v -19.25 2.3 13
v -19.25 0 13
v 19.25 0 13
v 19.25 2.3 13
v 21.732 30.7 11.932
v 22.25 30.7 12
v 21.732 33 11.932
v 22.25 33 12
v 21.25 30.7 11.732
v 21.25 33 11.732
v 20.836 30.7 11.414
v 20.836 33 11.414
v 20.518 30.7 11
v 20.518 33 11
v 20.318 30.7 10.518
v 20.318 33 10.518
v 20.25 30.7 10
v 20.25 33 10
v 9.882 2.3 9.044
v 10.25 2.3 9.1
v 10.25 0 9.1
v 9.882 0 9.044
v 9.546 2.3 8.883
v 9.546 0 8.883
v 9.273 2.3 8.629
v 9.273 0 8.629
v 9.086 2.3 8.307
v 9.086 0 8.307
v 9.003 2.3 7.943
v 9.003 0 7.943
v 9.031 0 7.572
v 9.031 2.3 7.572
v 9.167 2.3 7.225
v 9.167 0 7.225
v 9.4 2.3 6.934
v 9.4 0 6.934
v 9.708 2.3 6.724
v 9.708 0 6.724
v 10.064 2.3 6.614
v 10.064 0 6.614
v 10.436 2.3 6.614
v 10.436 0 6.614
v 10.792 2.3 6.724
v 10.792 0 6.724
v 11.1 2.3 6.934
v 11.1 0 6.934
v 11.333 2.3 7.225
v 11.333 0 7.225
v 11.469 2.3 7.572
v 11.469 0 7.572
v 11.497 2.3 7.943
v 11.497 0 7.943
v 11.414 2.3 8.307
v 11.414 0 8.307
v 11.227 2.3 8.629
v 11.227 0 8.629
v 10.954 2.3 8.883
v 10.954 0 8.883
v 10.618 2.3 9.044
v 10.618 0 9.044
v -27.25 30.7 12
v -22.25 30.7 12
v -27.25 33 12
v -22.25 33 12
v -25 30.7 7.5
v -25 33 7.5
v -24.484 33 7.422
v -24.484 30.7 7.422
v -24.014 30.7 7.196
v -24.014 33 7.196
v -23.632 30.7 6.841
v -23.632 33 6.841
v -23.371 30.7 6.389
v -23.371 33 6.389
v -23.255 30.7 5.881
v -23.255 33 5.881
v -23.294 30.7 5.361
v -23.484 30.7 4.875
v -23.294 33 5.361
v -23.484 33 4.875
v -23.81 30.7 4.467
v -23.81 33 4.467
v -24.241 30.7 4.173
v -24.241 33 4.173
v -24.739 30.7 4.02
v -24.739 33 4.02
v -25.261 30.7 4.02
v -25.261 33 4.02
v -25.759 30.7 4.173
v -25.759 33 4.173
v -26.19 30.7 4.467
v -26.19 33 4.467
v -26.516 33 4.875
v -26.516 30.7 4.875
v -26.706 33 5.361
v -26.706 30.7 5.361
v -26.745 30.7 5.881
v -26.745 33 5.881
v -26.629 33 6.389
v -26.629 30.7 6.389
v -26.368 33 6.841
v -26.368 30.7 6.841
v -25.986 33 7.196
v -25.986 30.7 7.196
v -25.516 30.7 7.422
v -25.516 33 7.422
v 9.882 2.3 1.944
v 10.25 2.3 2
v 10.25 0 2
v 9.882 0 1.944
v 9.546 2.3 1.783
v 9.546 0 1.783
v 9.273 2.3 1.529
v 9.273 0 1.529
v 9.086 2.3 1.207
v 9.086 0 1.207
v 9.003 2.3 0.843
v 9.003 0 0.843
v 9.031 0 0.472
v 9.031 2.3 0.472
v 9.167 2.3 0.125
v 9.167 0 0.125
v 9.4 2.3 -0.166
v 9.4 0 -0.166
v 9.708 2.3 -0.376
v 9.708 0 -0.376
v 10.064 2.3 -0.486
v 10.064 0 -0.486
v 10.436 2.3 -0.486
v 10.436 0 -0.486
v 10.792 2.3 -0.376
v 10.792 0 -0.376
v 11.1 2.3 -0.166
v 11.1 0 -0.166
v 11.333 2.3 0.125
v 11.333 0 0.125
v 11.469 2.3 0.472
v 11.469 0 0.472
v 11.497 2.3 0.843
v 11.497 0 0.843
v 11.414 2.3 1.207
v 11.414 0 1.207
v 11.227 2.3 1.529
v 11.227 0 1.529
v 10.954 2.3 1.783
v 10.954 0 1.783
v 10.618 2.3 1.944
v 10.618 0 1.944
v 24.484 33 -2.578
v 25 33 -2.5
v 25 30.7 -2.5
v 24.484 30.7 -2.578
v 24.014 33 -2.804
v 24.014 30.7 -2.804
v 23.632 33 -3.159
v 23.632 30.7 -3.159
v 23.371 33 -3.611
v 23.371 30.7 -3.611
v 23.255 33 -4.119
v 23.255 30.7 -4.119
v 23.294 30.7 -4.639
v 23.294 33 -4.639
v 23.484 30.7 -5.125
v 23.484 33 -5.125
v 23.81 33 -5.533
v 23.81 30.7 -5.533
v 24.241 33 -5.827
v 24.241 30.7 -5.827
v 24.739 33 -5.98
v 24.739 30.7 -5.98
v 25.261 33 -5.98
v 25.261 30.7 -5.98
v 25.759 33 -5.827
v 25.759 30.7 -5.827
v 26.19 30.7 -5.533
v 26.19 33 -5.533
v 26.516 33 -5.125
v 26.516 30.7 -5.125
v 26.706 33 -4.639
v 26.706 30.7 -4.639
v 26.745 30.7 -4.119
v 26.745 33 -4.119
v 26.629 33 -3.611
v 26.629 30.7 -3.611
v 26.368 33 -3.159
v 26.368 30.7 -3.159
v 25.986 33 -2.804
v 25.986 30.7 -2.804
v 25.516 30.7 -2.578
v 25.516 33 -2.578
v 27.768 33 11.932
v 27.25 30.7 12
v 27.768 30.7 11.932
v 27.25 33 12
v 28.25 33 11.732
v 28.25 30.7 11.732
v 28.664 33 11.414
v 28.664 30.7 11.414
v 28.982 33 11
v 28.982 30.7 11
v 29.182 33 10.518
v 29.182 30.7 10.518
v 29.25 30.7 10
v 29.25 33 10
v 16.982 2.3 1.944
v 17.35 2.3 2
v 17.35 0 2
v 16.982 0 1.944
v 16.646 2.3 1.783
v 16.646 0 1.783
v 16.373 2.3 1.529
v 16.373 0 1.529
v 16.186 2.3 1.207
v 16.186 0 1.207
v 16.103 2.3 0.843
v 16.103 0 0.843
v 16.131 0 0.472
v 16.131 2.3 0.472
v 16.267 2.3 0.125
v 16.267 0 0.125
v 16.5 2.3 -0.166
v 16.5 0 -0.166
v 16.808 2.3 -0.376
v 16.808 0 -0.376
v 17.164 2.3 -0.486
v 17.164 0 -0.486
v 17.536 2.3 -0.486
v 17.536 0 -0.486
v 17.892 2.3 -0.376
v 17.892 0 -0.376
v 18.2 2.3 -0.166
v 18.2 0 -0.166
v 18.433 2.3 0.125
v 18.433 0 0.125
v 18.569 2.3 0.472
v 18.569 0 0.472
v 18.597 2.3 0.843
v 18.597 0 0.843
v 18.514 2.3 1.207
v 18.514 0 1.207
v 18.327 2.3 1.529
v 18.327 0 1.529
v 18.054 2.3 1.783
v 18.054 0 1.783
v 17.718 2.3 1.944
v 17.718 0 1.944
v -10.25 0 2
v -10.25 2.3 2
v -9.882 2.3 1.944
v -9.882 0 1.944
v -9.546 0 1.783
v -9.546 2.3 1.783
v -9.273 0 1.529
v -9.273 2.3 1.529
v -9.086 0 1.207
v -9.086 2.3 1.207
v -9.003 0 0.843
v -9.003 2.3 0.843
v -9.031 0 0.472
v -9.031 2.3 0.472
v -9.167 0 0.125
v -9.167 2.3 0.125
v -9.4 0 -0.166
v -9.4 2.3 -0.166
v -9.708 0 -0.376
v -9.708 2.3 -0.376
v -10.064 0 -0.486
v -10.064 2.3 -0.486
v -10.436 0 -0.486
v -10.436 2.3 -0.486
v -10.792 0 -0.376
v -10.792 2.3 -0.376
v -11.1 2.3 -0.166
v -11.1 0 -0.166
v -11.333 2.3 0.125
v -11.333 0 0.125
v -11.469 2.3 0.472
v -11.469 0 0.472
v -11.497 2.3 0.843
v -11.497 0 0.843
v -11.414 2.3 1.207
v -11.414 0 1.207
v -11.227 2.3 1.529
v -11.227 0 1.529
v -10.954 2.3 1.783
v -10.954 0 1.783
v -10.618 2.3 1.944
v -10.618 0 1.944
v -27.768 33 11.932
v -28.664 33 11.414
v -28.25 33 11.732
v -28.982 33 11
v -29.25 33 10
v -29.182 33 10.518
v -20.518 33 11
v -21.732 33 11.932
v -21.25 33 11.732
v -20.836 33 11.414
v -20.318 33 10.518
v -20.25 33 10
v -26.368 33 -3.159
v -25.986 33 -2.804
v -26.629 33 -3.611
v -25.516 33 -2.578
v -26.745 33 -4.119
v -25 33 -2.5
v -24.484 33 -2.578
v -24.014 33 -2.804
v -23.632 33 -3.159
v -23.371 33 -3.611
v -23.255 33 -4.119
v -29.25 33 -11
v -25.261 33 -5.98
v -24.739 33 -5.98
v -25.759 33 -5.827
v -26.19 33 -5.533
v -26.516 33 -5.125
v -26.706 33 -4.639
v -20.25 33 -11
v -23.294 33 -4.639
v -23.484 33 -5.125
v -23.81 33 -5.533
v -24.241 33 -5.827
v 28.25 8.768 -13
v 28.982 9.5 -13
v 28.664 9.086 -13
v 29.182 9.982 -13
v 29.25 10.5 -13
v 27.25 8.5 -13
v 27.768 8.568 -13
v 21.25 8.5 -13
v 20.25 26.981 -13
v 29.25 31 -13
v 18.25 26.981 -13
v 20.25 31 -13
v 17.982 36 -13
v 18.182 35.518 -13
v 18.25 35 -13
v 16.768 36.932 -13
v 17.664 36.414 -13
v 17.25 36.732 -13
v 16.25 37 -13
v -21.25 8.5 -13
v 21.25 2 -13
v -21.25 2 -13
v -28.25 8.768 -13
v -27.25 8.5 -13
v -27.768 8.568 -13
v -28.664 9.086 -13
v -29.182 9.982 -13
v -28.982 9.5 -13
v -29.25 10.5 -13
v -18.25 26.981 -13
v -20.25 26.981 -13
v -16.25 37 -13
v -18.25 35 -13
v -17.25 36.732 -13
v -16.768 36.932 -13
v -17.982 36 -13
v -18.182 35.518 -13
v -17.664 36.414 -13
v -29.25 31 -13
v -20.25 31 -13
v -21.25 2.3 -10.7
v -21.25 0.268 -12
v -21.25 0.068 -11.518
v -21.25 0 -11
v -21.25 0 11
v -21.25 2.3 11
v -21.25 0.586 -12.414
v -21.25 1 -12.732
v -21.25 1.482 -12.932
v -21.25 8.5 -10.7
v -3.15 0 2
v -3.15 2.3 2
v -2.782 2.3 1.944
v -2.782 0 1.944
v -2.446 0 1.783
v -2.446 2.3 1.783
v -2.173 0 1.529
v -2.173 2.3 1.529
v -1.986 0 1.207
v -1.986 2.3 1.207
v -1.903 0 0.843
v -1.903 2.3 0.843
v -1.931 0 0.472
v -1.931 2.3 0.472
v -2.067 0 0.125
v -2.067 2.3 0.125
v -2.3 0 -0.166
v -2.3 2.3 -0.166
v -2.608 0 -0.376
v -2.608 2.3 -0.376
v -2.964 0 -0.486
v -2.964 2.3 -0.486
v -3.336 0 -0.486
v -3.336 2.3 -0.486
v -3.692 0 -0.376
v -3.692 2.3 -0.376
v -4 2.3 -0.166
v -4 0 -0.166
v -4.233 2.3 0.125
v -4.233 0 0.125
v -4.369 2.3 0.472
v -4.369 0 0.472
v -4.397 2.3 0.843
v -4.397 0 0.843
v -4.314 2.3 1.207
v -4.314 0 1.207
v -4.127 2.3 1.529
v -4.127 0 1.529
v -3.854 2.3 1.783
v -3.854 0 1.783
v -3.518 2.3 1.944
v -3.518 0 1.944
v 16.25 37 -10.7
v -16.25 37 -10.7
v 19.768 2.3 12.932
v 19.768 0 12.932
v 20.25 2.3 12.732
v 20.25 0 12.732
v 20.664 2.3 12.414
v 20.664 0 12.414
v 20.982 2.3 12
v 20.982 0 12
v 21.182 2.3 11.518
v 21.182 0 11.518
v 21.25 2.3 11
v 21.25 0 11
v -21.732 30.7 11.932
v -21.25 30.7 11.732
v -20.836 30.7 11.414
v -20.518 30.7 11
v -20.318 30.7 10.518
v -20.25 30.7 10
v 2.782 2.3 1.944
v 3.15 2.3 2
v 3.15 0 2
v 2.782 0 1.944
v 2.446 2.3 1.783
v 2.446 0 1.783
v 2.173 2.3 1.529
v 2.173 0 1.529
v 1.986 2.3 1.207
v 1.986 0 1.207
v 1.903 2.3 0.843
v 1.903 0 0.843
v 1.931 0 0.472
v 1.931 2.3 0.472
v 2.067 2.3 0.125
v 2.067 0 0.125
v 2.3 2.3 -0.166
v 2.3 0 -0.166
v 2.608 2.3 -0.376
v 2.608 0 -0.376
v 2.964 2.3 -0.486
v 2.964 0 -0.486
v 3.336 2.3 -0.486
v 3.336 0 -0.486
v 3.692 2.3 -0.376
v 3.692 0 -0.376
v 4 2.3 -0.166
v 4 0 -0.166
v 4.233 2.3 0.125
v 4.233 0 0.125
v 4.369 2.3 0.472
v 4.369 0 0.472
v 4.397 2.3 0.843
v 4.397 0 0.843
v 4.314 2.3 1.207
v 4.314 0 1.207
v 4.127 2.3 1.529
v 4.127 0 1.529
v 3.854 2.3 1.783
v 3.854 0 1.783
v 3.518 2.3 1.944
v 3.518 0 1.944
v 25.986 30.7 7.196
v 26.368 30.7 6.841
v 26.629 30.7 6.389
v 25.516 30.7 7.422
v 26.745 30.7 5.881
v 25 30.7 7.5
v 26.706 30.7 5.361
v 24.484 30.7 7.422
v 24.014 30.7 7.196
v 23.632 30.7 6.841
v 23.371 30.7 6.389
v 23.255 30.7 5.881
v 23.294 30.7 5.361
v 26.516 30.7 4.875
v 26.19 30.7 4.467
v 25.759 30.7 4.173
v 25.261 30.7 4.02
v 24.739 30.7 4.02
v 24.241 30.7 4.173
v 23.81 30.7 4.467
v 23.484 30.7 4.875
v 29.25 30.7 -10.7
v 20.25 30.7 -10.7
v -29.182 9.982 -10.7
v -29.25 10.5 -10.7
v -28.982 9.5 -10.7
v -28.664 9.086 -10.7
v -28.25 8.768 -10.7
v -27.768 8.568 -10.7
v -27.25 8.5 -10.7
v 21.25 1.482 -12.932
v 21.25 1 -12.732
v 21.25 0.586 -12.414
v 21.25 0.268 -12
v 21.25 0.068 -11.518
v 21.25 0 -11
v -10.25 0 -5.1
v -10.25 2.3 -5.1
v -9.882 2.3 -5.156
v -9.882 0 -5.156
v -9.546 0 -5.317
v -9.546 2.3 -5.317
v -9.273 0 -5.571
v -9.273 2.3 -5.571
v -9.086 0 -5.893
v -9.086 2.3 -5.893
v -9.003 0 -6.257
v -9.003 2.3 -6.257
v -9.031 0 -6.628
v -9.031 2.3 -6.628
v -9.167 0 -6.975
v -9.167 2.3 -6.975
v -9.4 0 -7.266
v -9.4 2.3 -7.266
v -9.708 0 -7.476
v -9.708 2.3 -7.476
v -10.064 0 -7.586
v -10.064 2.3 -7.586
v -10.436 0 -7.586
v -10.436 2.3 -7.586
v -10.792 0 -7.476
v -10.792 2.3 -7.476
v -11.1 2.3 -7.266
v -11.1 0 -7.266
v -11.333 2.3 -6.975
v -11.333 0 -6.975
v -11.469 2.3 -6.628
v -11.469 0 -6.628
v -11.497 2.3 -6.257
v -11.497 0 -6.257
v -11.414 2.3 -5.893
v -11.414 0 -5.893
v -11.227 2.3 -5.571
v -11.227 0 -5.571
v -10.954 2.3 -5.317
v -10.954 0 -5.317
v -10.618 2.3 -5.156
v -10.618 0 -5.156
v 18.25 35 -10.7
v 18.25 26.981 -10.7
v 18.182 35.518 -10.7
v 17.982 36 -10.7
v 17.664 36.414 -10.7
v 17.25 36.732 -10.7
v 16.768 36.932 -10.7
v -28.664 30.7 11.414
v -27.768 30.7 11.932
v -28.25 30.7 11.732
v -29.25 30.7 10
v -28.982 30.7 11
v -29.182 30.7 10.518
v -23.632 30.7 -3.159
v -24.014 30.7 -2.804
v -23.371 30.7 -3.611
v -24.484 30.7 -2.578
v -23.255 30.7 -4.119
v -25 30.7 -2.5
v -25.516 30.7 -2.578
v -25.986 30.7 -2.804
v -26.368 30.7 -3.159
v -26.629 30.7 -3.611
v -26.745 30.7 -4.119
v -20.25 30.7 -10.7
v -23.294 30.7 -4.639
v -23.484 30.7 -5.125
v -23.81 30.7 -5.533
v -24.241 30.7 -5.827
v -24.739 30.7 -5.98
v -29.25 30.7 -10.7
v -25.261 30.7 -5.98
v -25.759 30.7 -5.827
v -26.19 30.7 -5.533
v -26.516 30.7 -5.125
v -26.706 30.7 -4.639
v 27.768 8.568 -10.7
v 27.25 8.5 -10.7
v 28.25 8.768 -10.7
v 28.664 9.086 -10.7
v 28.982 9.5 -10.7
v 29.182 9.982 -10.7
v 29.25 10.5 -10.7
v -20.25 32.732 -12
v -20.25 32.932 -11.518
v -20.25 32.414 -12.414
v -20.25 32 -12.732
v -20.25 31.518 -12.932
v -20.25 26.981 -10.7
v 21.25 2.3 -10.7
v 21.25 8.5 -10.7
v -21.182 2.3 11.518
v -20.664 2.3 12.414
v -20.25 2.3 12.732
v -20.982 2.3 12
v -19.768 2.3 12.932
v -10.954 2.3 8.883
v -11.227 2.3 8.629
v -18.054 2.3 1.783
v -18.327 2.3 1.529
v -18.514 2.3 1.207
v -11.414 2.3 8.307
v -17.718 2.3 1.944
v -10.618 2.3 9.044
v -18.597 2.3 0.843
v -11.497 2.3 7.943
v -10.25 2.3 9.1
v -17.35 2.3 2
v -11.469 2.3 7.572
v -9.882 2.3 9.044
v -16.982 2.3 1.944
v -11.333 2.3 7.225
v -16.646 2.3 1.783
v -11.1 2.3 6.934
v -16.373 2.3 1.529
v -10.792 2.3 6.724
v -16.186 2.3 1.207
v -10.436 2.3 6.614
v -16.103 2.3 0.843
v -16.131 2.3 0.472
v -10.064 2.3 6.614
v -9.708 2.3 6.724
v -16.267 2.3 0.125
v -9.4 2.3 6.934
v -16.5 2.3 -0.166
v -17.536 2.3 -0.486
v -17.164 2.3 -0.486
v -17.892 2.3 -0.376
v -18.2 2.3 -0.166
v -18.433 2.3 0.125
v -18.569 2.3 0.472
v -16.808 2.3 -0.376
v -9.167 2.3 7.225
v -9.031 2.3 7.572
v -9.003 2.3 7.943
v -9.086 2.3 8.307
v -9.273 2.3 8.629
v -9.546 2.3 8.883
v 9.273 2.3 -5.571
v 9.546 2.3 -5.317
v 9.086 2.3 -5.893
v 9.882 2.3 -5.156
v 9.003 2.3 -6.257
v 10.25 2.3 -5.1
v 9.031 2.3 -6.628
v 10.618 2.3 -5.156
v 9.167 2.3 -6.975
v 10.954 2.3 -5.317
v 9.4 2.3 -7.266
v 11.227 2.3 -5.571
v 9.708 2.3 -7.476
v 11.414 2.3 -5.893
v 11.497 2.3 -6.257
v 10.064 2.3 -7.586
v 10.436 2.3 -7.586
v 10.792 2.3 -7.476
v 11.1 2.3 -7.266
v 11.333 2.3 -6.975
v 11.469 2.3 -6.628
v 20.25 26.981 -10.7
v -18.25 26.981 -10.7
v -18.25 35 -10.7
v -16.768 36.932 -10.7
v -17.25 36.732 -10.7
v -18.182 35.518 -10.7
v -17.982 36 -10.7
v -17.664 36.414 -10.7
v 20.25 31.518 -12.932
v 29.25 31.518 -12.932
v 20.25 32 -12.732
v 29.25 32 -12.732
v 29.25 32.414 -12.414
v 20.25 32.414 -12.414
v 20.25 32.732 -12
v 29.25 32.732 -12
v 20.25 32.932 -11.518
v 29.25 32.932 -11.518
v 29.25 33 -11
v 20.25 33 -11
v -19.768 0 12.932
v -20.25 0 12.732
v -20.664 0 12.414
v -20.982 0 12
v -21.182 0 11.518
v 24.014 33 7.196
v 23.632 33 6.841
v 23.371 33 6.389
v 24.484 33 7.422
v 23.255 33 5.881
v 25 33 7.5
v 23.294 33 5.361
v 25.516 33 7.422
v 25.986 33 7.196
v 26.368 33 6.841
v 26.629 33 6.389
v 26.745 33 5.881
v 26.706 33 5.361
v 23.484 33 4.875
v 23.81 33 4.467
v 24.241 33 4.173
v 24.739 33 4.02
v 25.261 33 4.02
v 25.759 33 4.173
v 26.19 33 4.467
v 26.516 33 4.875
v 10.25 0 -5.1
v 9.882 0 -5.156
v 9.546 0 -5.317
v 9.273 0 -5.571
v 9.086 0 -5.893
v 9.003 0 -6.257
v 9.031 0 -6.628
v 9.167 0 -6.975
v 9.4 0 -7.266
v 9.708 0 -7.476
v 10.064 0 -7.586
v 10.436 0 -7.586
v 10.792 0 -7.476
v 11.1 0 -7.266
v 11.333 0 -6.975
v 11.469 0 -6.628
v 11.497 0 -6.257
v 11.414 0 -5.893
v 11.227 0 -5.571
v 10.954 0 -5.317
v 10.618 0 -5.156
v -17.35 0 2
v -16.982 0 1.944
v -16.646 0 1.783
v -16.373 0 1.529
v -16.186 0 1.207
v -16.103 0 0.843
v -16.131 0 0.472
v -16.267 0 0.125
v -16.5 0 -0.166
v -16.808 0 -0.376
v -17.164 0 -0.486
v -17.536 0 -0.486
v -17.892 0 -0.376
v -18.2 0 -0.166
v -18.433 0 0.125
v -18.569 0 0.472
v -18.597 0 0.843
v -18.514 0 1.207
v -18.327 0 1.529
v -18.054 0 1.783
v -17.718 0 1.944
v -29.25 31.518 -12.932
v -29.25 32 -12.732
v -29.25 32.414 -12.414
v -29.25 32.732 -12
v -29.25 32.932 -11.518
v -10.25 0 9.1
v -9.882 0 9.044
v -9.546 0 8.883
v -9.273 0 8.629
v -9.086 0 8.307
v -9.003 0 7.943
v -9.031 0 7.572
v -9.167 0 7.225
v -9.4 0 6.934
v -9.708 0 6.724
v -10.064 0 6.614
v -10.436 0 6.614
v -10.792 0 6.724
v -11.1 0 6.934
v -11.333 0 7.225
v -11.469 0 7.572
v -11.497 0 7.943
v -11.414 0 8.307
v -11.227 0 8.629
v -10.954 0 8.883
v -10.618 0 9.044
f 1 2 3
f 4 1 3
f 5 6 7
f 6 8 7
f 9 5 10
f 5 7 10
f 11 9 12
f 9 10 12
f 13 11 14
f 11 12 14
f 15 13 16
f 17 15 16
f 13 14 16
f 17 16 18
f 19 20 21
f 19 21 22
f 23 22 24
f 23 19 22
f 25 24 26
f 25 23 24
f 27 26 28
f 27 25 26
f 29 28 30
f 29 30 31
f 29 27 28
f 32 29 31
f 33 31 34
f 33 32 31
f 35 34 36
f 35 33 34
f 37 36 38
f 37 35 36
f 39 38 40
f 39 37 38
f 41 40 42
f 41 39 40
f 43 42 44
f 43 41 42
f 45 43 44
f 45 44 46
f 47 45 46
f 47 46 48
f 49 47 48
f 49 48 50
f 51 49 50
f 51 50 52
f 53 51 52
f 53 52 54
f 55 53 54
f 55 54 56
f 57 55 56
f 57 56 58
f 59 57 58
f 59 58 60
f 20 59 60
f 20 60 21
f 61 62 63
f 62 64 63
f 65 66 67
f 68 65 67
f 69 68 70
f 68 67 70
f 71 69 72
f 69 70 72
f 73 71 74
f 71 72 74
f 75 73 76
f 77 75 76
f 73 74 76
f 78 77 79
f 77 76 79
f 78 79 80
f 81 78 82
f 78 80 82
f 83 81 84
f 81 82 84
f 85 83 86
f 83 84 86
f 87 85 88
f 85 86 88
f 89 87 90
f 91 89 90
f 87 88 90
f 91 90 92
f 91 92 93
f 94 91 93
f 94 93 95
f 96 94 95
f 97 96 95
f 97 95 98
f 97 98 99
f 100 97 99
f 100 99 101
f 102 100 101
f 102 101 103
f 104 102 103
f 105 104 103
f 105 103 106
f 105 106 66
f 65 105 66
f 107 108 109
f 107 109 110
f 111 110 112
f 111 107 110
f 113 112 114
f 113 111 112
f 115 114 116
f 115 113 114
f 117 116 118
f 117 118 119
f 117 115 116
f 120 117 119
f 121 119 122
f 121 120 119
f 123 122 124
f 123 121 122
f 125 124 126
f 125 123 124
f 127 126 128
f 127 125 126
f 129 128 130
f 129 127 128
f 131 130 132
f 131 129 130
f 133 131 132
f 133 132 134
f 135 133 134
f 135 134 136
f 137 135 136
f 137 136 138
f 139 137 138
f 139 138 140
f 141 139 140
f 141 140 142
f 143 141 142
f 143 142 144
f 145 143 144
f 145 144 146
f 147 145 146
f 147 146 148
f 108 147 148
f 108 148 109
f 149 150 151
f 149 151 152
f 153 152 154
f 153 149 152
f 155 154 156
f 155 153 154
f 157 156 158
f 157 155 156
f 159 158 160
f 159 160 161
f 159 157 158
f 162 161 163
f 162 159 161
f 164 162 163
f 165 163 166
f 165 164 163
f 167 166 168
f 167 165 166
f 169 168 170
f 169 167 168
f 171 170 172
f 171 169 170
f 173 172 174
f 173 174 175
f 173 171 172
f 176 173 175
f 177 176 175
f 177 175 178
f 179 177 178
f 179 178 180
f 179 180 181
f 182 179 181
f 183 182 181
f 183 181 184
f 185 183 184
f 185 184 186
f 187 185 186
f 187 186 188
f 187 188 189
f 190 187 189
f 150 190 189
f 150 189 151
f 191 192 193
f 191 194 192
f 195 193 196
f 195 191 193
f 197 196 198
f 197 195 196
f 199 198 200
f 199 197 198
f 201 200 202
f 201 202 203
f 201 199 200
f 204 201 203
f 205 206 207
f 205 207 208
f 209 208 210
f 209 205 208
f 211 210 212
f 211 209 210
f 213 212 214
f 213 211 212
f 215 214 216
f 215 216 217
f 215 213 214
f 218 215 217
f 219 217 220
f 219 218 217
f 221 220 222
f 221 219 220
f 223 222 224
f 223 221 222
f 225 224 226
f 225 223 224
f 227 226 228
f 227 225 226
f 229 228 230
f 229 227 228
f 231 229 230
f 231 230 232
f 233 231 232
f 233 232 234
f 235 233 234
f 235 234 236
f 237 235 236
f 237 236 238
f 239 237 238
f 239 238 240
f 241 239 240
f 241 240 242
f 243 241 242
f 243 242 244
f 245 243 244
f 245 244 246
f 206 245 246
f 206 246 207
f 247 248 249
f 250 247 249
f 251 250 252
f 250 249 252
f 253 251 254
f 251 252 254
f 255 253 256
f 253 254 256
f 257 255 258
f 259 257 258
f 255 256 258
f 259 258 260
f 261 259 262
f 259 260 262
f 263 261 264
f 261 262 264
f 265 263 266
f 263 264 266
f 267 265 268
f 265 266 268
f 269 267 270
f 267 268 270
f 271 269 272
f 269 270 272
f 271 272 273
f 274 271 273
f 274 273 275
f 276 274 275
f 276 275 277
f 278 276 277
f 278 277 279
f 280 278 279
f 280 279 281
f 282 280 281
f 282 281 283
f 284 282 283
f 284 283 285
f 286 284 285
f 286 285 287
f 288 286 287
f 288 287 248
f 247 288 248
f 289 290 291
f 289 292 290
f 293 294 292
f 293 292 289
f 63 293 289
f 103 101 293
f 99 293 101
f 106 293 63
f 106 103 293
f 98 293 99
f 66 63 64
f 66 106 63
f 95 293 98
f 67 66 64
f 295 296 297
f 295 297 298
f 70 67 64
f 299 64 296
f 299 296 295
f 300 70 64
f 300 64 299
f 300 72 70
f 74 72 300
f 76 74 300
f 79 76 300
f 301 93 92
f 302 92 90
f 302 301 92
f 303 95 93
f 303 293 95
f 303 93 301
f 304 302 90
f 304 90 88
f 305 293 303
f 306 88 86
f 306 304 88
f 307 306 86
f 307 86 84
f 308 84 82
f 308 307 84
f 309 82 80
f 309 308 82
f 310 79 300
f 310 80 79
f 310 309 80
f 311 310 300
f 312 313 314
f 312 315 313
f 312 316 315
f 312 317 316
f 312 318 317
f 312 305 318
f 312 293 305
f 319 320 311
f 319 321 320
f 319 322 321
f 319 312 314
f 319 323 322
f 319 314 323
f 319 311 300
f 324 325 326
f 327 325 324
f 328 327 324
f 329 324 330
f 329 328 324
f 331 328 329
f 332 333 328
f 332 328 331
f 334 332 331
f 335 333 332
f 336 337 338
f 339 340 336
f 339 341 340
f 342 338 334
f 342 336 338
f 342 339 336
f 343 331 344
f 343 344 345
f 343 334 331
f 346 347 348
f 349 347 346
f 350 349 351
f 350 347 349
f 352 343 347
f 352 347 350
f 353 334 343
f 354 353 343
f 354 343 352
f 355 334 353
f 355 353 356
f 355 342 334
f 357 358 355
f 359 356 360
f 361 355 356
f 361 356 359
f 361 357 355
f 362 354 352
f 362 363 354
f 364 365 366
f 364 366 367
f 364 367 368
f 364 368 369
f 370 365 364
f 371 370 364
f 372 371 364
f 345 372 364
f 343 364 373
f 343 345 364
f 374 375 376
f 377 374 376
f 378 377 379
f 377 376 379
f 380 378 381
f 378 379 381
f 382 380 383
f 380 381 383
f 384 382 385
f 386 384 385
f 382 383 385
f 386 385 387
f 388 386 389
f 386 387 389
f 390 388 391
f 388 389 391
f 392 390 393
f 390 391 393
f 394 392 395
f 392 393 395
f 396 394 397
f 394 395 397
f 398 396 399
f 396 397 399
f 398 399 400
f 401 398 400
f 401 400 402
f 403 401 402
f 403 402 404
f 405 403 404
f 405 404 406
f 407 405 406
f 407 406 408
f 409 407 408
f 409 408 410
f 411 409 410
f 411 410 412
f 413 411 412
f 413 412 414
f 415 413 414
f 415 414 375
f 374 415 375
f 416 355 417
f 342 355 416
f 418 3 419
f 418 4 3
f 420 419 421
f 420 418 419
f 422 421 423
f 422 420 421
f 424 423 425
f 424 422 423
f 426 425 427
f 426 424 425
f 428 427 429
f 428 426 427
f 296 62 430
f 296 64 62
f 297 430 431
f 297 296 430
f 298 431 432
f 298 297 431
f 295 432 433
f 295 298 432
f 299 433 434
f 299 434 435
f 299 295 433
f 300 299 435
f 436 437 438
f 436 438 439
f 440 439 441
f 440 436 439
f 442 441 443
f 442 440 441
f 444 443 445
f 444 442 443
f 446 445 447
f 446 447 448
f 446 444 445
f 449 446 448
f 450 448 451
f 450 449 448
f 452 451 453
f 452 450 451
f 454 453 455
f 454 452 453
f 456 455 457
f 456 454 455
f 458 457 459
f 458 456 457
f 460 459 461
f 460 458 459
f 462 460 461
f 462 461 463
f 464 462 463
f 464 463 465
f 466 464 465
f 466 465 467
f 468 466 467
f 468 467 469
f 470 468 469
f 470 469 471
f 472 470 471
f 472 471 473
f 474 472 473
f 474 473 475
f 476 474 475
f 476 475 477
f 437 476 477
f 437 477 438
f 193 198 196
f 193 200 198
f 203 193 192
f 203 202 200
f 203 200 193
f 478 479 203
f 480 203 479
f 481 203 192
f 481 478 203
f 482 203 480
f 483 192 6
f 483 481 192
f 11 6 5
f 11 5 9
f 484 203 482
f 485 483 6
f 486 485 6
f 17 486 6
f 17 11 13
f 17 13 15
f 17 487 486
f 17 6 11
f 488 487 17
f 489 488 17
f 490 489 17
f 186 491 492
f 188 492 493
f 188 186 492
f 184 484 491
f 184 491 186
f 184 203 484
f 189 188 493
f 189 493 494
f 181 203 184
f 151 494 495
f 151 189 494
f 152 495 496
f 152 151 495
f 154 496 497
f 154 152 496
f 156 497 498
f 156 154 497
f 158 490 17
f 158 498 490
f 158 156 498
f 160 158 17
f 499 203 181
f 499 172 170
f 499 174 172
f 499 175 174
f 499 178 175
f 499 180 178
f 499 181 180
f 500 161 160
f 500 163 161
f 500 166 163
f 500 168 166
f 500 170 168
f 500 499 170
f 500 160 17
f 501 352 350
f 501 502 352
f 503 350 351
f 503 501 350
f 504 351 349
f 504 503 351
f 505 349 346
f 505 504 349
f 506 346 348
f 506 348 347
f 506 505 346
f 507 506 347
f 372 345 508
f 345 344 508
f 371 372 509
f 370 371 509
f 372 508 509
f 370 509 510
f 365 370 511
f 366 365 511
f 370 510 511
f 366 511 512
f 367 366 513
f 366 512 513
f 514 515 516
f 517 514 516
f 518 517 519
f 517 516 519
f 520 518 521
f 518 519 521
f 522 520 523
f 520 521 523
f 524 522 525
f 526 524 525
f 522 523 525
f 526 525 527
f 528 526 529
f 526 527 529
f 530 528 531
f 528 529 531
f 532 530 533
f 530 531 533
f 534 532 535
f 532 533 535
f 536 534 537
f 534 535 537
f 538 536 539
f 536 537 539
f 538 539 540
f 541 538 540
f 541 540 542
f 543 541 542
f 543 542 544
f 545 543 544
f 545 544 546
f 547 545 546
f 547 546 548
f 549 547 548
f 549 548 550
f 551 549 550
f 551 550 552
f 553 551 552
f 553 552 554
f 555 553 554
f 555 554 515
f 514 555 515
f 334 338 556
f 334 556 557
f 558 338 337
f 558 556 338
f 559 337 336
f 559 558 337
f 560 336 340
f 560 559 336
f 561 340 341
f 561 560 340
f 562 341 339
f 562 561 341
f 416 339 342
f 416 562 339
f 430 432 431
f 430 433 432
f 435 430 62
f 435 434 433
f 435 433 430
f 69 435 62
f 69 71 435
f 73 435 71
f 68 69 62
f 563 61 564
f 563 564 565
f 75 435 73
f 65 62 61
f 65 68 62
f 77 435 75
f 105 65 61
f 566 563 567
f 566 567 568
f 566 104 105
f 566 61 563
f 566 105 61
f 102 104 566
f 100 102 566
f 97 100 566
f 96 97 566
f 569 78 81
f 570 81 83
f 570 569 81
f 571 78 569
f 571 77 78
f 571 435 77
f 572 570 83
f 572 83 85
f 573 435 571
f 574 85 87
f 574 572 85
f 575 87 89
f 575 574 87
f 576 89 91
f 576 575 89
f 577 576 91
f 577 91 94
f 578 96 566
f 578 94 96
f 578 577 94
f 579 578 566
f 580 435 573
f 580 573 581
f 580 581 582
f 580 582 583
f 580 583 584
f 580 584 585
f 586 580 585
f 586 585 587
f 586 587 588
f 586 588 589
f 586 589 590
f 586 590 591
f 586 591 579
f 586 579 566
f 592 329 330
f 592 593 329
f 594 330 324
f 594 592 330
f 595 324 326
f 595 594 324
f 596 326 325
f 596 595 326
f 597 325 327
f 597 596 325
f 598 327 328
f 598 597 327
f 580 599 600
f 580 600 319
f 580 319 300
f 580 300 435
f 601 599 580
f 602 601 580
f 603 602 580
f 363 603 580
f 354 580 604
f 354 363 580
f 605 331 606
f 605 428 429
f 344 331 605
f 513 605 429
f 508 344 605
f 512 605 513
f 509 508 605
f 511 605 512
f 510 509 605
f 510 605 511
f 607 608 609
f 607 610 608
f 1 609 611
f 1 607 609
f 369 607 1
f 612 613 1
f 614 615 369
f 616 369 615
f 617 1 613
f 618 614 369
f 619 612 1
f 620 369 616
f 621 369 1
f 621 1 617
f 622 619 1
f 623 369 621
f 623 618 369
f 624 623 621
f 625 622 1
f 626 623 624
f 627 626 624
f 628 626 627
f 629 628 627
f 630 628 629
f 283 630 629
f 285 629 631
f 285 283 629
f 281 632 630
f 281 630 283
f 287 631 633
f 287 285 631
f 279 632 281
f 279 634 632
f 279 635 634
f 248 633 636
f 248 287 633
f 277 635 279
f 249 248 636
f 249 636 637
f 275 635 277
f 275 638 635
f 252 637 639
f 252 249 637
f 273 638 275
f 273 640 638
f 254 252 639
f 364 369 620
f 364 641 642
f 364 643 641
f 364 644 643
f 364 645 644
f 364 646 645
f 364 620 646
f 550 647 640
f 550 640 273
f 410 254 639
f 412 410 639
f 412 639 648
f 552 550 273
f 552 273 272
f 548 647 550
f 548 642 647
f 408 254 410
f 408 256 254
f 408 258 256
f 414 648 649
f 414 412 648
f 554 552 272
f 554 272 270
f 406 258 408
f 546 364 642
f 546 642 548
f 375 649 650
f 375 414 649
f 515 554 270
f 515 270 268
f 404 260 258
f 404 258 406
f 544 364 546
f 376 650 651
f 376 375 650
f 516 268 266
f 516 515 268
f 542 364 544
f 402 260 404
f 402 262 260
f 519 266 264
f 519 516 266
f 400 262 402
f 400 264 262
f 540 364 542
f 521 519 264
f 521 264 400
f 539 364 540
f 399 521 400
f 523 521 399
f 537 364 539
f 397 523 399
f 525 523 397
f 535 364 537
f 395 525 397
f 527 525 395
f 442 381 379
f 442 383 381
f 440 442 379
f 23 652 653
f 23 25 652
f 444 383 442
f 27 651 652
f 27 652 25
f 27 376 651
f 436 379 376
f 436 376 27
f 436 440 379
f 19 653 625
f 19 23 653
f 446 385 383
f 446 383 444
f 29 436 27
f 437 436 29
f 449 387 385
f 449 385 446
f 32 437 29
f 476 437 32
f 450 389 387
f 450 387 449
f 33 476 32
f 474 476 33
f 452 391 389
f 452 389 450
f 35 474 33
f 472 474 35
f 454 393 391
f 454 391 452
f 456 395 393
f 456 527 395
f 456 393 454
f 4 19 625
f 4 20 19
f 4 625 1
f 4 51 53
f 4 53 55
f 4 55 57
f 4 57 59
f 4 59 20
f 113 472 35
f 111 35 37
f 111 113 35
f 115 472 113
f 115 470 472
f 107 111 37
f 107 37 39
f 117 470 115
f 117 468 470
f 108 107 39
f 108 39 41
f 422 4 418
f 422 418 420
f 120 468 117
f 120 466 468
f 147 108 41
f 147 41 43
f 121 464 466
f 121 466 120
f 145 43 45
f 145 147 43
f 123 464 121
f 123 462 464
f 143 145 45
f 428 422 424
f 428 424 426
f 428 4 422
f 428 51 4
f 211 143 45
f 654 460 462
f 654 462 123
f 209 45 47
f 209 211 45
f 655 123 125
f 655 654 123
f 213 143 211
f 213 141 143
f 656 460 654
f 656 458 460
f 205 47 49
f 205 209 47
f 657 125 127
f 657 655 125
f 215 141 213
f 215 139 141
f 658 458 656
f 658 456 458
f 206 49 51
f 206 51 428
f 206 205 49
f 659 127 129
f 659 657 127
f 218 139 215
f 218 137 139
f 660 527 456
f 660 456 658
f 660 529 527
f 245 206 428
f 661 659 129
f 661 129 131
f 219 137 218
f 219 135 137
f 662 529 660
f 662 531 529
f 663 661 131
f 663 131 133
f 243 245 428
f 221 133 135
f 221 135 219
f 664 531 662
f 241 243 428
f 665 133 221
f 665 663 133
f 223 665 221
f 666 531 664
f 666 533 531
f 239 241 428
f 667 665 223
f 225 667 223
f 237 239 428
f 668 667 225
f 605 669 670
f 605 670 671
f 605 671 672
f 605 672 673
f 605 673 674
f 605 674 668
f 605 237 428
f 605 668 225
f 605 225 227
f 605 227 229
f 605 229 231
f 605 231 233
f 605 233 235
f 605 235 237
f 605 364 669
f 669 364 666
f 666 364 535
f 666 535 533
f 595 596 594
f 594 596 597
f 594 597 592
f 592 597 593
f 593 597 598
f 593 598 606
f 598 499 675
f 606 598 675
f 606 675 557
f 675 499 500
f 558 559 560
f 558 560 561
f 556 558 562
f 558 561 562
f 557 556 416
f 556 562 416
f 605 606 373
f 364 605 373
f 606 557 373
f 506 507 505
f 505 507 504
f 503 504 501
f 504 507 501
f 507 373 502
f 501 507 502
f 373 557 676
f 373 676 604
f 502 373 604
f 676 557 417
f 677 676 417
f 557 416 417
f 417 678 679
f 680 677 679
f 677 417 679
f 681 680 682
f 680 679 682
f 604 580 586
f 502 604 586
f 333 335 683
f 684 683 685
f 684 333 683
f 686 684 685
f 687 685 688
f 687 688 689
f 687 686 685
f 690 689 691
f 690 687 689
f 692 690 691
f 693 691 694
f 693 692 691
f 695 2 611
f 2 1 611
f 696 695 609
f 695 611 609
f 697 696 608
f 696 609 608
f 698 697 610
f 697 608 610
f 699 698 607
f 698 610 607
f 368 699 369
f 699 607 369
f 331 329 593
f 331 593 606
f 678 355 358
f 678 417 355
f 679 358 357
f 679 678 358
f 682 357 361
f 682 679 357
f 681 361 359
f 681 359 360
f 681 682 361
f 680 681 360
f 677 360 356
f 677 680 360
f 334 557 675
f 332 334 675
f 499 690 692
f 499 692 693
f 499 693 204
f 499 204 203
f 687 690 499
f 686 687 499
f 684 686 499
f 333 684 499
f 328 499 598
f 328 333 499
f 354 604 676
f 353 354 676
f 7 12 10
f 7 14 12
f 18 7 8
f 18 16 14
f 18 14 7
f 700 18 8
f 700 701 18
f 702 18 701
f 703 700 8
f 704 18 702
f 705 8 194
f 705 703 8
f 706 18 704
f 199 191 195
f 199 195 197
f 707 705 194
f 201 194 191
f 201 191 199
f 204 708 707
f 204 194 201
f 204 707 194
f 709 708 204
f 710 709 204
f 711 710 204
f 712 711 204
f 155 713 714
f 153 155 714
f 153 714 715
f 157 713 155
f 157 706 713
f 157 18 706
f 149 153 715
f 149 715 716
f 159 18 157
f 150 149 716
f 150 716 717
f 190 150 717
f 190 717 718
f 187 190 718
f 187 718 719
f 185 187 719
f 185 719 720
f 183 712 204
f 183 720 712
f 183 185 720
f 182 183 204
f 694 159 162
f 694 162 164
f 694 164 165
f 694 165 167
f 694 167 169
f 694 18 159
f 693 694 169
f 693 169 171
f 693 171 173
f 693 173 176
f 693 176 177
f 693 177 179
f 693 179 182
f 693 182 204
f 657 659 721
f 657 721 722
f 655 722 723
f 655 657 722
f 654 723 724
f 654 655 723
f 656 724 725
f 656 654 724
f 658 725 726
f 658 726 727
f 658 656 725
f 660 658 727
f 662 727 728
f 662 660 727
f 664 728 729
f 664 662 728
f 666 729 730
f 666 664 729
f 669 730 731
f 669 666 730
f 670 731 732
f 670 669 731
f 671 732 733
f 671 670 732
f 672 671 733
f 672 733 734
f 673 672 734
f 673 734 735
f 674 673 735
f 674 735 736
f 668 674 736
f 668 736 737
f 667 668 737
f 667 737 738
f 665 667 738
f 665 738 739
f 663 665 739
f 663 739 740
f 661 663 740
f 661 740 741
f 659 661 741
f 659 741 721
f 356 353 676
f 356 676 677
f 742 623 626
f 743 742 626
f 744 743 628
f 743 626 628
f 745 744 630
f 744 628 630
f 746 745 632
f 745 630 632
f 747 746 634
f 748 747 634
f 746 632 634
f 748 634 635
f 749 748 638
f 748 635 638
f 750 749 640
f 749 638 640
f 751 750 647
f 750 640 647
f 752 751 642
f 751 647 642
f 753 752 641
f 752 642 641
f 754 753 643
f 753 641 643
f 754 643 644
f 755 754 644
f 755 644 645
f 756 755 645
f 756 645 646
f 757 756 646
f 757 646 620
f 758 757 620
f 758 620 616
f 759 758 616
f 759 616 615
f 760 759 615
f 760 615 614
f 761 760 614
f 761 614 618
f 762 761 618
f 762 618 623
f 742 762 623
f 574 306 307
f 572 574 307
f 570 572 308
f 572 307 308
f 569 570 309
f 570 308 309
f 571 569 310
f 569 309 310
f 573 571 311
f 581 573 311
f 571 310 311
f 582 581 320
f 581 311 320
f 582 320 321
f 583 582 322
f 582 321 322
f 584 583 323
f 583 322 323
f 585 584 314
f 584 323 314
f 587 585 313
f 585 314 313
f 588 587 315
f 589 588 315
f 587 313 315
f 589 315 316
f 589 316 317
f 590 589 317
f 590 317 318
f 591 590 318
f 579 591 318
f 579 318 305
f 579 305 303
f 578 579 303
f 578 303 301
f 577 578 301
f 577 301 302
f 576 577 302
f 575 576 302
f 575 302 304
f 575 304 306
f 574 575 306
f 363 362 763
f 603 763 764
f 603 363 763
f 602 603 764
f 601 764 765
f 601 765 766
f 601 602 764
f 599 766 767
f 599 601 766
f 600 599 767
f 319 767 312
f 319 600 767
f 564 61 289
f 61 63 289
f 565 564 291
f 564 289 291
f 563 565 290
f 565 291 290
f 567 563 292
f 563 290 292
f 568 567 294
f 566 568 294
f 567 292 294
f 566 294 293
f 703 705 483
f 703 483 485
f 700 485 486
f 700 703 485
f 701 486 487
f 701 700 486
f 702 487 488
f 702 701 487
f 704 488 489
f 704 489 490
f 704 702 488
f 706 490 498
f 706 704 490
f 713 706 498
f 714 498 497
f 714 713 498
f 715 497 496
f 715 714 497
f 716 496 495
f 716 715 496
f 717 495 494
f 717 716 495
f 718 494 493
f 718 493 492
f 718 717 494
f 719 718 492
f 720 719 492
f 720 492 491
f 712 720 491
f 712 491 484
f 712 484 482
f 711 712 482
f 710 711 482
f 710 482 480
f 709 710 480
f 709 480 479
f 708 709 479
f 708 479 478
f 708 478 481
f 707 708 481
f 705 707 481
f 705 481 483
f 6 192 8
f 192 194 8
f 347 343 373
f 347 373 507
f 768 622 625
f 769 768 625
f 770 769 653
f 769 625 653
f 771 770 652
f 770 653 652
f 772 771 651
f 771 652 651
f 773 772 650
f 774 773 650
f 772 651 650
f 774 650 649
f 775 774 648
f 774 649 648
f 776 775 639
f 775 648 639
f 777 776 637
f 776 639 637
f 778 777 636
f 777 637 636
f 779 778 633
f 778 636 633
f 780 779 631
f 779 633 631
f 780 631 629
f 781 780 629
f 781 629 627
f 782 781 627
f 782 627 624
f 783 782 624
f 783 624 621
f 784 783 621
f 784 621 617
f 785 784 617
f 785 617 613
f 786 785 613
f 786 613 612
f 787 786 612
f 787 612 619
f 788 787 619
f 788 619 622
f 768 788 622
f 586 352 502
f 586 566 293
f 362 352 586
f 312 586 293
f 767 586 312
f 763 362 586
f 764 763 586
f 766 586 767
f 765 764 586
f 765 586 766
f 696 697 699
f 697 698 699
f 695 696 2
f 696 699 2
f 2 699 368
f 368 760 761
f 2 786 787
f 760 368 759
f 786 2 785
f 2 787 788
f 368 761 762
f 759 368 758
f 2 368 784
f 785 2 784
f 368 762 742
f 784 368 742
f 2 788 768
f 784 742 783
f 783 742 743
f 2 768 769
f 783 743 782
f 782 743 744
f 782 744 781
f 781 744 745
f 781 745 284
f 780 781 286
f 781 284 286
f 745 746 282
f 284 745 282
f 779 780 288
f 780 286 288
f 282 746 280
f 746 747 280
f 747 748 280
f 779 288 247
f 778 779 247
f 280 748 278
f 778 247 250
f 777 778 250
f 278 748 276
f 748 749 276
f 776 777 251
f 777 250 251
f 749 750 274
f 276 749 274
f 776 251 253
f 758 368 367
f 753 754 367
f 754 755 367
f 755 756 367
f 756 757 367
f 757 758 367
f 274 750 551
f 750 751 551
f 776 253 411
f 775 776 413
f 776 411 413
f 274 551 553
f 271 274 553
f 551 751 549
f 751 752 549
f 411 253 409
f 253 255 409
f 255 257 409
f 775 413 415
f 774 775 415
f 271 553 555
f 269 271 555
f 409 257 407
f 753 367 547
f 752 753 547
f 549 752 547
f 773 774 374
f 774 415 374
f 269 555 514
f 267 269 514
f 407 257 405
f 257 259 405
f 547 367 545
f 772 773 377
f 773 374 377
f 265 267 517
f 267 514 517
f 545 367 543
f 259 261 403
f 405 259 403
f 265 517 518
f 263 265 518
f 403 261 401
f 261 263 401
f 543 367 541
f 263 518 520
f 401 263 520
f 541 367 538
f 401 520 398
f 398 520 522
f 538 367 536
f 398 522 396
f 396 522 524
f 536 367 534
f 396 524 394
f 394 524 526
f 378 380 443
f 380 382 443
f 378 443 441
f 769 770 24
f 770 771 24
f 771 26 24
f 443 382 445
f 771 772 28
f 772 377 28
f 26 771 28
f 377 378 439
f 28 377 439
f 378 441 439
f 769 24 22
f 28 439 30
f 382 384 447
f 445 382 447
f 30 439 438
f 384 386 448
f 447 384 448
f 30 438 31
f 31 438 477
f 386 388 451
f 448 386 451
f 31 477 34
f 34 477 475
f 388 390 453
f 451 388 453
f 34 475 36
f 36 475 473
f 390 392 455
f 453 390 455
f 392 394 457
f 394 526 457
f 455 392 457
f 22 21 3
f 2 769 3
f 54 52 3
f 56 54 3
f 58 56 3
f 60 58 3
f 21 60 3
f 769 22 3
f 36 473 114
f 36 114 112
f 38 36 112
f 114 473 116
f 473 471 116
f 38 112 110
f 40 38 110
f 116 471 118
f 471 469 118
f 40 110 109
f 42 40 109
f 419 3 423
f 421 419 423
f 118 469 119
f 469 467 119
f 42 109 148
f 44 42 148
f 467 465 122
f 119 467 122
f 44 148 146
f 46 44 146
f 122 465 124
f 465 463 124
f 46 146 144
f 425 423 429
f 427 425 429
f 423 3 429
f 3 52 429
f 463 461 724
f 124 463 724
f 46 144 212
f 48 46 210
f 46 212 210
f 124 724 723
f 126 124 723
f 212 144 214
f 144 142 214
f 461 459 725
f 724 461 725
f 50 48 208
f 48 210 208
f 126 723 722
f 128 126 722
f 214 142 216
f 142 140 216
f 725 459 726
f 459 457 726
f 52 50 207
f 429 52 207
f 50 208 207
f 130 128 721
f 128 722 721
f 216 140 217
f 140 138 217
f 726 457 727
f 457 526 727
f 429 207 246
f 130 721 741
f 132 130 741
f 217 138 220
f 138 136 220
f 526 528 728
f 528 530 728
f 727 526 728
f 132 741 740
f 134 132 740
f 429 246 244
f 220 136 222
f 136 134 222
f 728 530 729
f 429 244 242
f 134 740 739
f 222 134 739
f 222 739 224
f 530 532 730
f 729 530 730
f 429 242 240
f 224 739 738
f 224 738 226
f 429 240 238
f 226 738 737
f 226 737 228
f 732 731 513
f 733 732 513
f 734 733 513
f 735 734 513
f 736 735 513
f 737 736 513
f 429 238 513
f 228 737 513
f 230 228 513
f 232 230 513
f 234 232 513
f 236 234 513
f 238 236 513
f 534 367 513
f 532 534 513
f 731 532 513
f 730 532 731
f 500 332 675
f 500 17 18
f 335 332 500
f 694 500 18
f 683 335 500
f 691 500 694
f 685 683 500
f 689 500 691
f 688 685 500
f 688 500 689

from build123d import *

# Parameters (mm, degrees)
SKETCH_2_W          = 42.5
SKETCH_2_H          = 26
EXTRUDE_1_DEPTH     = 2.3
EXTRUDE_3_DEPTH     = 2.3
SKETCH_5_W          = 9
SKETCH_5_H          = 2.3
EXTRUDE_6_DEPTH     = 25
FILLET_1_R          = 2
CUT_EXTRUDE_1_REACH = 47.973
SKETCH_6_R          = 1.75
CUT_EXTRUDE_2_REACH = 49.209
SKETCH_7_R          = 1.25


with BuildPart() as part:
    # 草图2 → 凸台-拉伸1 (new body)
    with BuildSketch(Plane(origin=(0, 0, 0), x_dir=(1, 0, 0), z_dir=(0, 1, 0))):
        Rectangle(SKETCH_2_W, SKETCH_2_H)
    extrude(amount=EXTRUDE_1_DEPTH)

    # 草图3 → 凸台-拉伸3 (add)
    with BuildSketch(Plane(origin=(0, 0, -13), x_dir=(-1, 0, 0), z_dir=(0, 0, -1))):
        Polygon((20.25, 33), (20.25, 26.981475126), (18.25, 26.981475126), (18.25, 37), (-18.25, 37), (-18.25, 26.981475126), (-20.25, 26.981475126), (-20.25, 33), (-29.25, 33), (-29.25, 8.5), (-21.25, 8.5), (-21.25, 0), (21.25, 0), (21.25, 8.5), (29.25, 8.5), (29.25, 33), align=None)
    extrude(amount=-EXTRUDE_3_DEPTH)

    # 草图5 → 凸台-拉伸6 (add)
    with BuildSketch(Plane(origin=(0, 0, -13), x_dir=(-1, 0, 0), z_dir=(0, 0, -1))):
        with Locations((-24.75, 31.85)):
            Rectangle(SKETCH_5_W, SKETCH_5_H)
        with Locations((24.75, 31.85)):
            Rectangle(SKETCH_5_W, SKETCH_5_H)
    extrude(amount=-EXTRUDE_6_DEPTH)

    # 圆角1
    fillet_1_edges = [part.edges().sort_by_distance(p)[0] for p in [
        (29.25, 8.5, -11.85),
        (18.25, 37, -11.85),
        (-18.25, 37, -11.85),
        (-29.25, 8.5, -11.85),
        (-24.75, 33, -13),
        (24.75, 33, -13),
        (0, 0, -13),
        (29.25, 31.85, 12),
        (20.25, 31.85, 12),
        (21.25, 1.15, 13),
        (-21.25, 1.15, 13),
        (-20.25, 31.85, 12),
        (-29.25, 31.85, 12),
    ]]
    fillet(fillet_1_edges, radius=FILLET_1_R)

    # 草图6 → 切除-拉伸1 (cut, up to next)
    with BuildSketch(Plane(origin=(0, 33, 0), x_dir=(1, 0, 0), z_dir=(0, 1, 0)), mode=Mode.PRIVATE) as cut_extrude_1_sk1:
        with Locations(Location((-25, -5.75, 0), (0, 0, 270))):
            Circle(SKETCH_6_R)
    cut_extrude_1_tool1 = extrude(cut_extrude_1_sk1.sketch, amount=-CUT_EXTRUDE_1_REACH, mode=Mode.PRIVATE) & part.part
    # 草图6 → 切除-拉伸1 (cut, up to next)
    with BuildSketch(Plane(origin=(0, 33, 0), x_dir=(1, 0, 0), z_dir=(0, 1, 0)), mode=Mode.PRIVATE) as cut_extrude_1_sk2:
        with Locations(Location((-25, 4.25, 0), (0, 0, 270))):
            Circle(SKETCH_6_R)
    cut_extrude_1_tool2 = extrude(cut_extrude_1_sk2.sketch, amount=-CUT_EXTRUDE_1_REACH, mode=Mode.PRIVATE) & part.part
    cut_extrude_1_1 = cut_extrude_1_tool1.solids().sort_by_distance((-25, 33, 5.75))[0]
    add(cut_extrude_1_1, mode=Mode.SUBTRACT)
    cut_extrude_1_2 = cut_extrude_1_tool2.solids().sort_by_distance((-25, 33, -4.25))[0]
    add(cut_extrude_1_2, mode=Mode.SUBTRACT)
    cut_extrude_1 = cut_extrude_1_1 + cut_extrude_1_2  # 切除-拉伸1 as one shape, for the pattern or mirror that repeats it

    # 草图7 → 切除-拉伸2 (cut, up to next)
    with BuildSketch(Plane(origin=(0, 2.3, 0), x_dir=(1, 0, 0), z_dir=(0, 1, 0)), mode=Mode.PRIVATE) as cut_extrude_2_sk1:
        with Locations(Location((-10.25, -0.75, 0), (0, 0, 270))):
            Circle(SKETCH_7_R)
    cut_extrude_2_tool1 = extrude(cut_extrude_2_sk1.sketch, amount=-CUT_EXTRUDE_2_REACH, mode=Mode.PRIVATE) & part.part
    # 草图7 → 切除-拉伸2 (cut, up to next)
    with BuildSketch(Plane(origin=(0, 2.3, 0), x_dir=(1, 0, 0), z_dir=(0, 1, 0)), mode=Mode.PRIVATE) as cut_extrude_2_sk2:
        with Locations(Location((-10.25, -7.85, 0), (0, 0, 270))):
            Circle(SKETCH_7_R)
    cut_extrude_2_tool2 = extrude(cut_extrude_2_sk2.sketch, amount=-CUT_EXTRUDE_2_REACH, mode=Mode.PRIVATE) & part.part
    # 草图7 → 切除-拉伸2 (cut, up to next)
    with BuildSketch(Plane(origin=(0, 2.3, 0), x_dir=(1, 0, 0), z_dir=(0, 1, 0)), mode=Mode.PRIVATE) as cut_extrude_2_sk3:
        with Locations(Location((-17.35, -0.75, 0), (0, 0, 270))):
            Circle(SKETCH_7_R)
    cut_extrude_2_tool3 = extrude(cut_extrude_2_sk3.sketch, amount=-CUT_EXTRUDE_2_REACH, mode=Mode.PRIVATE) & part.part
    # 草图7 → 切除-拉伸2 (cut, up to next)
    with BuildSketch(Plane(origin=(0, 2.3, 0), x_dir=(1, 0, 0), z_dir=(0, 1, 0)), mode=Mode.PRIVATE) as cut_extrude_2_sk4:
        with Locations(Location((-10.25, 6.35, 0), (0, 0, 270))):
            Circle(SKETCH_7_R)
    cut_extrude_2_tool4 = extrude(cut_extrude_2_sk4.sketch, amount=-CUT_EXTRUDE_2_REACH, mode=Mode.PRIVATE) & part.part
    # 草图7 → 切除-拉伸2 (cut, up to next)
    with BuildSketch(Plane(origin=(0, 2.3, 0), x_dir=(1, 0, 0), z_dir=(0, 1, 0)), mode=Mode.PRIVATE) as cut_extrude_2_sk5:
        with Locations(Location((-3.15, -0.75, 0), (0, 0, 270))):
            Circle(SKETCH_7_R)
    cut_extrude_2_tool5 = extrude(cut_extrude_2_sk5.sketch, amount=-CUT_EXTRUDE_2_REACH, mode=Mode.PRIVATE) & part.part
    cut_extrude_2_1 = cut_extrude_2_tool1.solids().sort_by_distance((-10.25, 2.3, 0.75))[0]
    add(cut_extrude_2_1, mode=Mode.SUBTRACT)
    cut_extrude_2_2 = cut_extrude_2_tool2.solids().sort_by_distance((-10.25, 2.3, 7.85))[0]
    add(cut_extrude_2_2, mode=Mode.SUBTRACT)
    cut_extrude_2_3 = cut_extrude_2_tool3.solids().sort_by_distance((-17.35, 2.3, 0.75))[0]
    add(cut_extrude_2_3, mode=Mode.SUBTRACT)
    cut_extrude_2_4 = cut_extrude_2_tool4.solids().sort_by_distance((-10.25, 2.3, -6.35))[0]
    add(cut_extrude_2_4, mode=Mode.SUBTRACT)
    cut_extrude_2_5 = cut_extrude_2_tool5.solids().sort_by_distance((-3.15, 2.3, 0.75))[0]
    add(cut_extrude_2_5, mode=Mode.SUBTRACT)
    cut_extrude_2 = cut_extrude_2_1 + cut_extrude_2_2 + cut_extrude_2_3 + cut_extrude_2_4 + cut_extrude_2_5  # 切除-拉伸2 as one shape, for the pattern or mirror that repeats it

    # 镜向1: 切除-拉伸1, 切除-拉伸2 across plane
    add(cut_extrude_1.mirror(Plane(origin=(0, 0, 0), x_dir=(0, 0, 1), z_dir=(1, 0, 0))), mode=Mode.SUBTRACT)
    add(cut_extrude_2.mirror(Plane(origin=(0, 0, 0), x_dir=(0, 0, 1), z_dir=(1, 0, 0))), mode=Mode.SUBTRACT)


solid = part.part
